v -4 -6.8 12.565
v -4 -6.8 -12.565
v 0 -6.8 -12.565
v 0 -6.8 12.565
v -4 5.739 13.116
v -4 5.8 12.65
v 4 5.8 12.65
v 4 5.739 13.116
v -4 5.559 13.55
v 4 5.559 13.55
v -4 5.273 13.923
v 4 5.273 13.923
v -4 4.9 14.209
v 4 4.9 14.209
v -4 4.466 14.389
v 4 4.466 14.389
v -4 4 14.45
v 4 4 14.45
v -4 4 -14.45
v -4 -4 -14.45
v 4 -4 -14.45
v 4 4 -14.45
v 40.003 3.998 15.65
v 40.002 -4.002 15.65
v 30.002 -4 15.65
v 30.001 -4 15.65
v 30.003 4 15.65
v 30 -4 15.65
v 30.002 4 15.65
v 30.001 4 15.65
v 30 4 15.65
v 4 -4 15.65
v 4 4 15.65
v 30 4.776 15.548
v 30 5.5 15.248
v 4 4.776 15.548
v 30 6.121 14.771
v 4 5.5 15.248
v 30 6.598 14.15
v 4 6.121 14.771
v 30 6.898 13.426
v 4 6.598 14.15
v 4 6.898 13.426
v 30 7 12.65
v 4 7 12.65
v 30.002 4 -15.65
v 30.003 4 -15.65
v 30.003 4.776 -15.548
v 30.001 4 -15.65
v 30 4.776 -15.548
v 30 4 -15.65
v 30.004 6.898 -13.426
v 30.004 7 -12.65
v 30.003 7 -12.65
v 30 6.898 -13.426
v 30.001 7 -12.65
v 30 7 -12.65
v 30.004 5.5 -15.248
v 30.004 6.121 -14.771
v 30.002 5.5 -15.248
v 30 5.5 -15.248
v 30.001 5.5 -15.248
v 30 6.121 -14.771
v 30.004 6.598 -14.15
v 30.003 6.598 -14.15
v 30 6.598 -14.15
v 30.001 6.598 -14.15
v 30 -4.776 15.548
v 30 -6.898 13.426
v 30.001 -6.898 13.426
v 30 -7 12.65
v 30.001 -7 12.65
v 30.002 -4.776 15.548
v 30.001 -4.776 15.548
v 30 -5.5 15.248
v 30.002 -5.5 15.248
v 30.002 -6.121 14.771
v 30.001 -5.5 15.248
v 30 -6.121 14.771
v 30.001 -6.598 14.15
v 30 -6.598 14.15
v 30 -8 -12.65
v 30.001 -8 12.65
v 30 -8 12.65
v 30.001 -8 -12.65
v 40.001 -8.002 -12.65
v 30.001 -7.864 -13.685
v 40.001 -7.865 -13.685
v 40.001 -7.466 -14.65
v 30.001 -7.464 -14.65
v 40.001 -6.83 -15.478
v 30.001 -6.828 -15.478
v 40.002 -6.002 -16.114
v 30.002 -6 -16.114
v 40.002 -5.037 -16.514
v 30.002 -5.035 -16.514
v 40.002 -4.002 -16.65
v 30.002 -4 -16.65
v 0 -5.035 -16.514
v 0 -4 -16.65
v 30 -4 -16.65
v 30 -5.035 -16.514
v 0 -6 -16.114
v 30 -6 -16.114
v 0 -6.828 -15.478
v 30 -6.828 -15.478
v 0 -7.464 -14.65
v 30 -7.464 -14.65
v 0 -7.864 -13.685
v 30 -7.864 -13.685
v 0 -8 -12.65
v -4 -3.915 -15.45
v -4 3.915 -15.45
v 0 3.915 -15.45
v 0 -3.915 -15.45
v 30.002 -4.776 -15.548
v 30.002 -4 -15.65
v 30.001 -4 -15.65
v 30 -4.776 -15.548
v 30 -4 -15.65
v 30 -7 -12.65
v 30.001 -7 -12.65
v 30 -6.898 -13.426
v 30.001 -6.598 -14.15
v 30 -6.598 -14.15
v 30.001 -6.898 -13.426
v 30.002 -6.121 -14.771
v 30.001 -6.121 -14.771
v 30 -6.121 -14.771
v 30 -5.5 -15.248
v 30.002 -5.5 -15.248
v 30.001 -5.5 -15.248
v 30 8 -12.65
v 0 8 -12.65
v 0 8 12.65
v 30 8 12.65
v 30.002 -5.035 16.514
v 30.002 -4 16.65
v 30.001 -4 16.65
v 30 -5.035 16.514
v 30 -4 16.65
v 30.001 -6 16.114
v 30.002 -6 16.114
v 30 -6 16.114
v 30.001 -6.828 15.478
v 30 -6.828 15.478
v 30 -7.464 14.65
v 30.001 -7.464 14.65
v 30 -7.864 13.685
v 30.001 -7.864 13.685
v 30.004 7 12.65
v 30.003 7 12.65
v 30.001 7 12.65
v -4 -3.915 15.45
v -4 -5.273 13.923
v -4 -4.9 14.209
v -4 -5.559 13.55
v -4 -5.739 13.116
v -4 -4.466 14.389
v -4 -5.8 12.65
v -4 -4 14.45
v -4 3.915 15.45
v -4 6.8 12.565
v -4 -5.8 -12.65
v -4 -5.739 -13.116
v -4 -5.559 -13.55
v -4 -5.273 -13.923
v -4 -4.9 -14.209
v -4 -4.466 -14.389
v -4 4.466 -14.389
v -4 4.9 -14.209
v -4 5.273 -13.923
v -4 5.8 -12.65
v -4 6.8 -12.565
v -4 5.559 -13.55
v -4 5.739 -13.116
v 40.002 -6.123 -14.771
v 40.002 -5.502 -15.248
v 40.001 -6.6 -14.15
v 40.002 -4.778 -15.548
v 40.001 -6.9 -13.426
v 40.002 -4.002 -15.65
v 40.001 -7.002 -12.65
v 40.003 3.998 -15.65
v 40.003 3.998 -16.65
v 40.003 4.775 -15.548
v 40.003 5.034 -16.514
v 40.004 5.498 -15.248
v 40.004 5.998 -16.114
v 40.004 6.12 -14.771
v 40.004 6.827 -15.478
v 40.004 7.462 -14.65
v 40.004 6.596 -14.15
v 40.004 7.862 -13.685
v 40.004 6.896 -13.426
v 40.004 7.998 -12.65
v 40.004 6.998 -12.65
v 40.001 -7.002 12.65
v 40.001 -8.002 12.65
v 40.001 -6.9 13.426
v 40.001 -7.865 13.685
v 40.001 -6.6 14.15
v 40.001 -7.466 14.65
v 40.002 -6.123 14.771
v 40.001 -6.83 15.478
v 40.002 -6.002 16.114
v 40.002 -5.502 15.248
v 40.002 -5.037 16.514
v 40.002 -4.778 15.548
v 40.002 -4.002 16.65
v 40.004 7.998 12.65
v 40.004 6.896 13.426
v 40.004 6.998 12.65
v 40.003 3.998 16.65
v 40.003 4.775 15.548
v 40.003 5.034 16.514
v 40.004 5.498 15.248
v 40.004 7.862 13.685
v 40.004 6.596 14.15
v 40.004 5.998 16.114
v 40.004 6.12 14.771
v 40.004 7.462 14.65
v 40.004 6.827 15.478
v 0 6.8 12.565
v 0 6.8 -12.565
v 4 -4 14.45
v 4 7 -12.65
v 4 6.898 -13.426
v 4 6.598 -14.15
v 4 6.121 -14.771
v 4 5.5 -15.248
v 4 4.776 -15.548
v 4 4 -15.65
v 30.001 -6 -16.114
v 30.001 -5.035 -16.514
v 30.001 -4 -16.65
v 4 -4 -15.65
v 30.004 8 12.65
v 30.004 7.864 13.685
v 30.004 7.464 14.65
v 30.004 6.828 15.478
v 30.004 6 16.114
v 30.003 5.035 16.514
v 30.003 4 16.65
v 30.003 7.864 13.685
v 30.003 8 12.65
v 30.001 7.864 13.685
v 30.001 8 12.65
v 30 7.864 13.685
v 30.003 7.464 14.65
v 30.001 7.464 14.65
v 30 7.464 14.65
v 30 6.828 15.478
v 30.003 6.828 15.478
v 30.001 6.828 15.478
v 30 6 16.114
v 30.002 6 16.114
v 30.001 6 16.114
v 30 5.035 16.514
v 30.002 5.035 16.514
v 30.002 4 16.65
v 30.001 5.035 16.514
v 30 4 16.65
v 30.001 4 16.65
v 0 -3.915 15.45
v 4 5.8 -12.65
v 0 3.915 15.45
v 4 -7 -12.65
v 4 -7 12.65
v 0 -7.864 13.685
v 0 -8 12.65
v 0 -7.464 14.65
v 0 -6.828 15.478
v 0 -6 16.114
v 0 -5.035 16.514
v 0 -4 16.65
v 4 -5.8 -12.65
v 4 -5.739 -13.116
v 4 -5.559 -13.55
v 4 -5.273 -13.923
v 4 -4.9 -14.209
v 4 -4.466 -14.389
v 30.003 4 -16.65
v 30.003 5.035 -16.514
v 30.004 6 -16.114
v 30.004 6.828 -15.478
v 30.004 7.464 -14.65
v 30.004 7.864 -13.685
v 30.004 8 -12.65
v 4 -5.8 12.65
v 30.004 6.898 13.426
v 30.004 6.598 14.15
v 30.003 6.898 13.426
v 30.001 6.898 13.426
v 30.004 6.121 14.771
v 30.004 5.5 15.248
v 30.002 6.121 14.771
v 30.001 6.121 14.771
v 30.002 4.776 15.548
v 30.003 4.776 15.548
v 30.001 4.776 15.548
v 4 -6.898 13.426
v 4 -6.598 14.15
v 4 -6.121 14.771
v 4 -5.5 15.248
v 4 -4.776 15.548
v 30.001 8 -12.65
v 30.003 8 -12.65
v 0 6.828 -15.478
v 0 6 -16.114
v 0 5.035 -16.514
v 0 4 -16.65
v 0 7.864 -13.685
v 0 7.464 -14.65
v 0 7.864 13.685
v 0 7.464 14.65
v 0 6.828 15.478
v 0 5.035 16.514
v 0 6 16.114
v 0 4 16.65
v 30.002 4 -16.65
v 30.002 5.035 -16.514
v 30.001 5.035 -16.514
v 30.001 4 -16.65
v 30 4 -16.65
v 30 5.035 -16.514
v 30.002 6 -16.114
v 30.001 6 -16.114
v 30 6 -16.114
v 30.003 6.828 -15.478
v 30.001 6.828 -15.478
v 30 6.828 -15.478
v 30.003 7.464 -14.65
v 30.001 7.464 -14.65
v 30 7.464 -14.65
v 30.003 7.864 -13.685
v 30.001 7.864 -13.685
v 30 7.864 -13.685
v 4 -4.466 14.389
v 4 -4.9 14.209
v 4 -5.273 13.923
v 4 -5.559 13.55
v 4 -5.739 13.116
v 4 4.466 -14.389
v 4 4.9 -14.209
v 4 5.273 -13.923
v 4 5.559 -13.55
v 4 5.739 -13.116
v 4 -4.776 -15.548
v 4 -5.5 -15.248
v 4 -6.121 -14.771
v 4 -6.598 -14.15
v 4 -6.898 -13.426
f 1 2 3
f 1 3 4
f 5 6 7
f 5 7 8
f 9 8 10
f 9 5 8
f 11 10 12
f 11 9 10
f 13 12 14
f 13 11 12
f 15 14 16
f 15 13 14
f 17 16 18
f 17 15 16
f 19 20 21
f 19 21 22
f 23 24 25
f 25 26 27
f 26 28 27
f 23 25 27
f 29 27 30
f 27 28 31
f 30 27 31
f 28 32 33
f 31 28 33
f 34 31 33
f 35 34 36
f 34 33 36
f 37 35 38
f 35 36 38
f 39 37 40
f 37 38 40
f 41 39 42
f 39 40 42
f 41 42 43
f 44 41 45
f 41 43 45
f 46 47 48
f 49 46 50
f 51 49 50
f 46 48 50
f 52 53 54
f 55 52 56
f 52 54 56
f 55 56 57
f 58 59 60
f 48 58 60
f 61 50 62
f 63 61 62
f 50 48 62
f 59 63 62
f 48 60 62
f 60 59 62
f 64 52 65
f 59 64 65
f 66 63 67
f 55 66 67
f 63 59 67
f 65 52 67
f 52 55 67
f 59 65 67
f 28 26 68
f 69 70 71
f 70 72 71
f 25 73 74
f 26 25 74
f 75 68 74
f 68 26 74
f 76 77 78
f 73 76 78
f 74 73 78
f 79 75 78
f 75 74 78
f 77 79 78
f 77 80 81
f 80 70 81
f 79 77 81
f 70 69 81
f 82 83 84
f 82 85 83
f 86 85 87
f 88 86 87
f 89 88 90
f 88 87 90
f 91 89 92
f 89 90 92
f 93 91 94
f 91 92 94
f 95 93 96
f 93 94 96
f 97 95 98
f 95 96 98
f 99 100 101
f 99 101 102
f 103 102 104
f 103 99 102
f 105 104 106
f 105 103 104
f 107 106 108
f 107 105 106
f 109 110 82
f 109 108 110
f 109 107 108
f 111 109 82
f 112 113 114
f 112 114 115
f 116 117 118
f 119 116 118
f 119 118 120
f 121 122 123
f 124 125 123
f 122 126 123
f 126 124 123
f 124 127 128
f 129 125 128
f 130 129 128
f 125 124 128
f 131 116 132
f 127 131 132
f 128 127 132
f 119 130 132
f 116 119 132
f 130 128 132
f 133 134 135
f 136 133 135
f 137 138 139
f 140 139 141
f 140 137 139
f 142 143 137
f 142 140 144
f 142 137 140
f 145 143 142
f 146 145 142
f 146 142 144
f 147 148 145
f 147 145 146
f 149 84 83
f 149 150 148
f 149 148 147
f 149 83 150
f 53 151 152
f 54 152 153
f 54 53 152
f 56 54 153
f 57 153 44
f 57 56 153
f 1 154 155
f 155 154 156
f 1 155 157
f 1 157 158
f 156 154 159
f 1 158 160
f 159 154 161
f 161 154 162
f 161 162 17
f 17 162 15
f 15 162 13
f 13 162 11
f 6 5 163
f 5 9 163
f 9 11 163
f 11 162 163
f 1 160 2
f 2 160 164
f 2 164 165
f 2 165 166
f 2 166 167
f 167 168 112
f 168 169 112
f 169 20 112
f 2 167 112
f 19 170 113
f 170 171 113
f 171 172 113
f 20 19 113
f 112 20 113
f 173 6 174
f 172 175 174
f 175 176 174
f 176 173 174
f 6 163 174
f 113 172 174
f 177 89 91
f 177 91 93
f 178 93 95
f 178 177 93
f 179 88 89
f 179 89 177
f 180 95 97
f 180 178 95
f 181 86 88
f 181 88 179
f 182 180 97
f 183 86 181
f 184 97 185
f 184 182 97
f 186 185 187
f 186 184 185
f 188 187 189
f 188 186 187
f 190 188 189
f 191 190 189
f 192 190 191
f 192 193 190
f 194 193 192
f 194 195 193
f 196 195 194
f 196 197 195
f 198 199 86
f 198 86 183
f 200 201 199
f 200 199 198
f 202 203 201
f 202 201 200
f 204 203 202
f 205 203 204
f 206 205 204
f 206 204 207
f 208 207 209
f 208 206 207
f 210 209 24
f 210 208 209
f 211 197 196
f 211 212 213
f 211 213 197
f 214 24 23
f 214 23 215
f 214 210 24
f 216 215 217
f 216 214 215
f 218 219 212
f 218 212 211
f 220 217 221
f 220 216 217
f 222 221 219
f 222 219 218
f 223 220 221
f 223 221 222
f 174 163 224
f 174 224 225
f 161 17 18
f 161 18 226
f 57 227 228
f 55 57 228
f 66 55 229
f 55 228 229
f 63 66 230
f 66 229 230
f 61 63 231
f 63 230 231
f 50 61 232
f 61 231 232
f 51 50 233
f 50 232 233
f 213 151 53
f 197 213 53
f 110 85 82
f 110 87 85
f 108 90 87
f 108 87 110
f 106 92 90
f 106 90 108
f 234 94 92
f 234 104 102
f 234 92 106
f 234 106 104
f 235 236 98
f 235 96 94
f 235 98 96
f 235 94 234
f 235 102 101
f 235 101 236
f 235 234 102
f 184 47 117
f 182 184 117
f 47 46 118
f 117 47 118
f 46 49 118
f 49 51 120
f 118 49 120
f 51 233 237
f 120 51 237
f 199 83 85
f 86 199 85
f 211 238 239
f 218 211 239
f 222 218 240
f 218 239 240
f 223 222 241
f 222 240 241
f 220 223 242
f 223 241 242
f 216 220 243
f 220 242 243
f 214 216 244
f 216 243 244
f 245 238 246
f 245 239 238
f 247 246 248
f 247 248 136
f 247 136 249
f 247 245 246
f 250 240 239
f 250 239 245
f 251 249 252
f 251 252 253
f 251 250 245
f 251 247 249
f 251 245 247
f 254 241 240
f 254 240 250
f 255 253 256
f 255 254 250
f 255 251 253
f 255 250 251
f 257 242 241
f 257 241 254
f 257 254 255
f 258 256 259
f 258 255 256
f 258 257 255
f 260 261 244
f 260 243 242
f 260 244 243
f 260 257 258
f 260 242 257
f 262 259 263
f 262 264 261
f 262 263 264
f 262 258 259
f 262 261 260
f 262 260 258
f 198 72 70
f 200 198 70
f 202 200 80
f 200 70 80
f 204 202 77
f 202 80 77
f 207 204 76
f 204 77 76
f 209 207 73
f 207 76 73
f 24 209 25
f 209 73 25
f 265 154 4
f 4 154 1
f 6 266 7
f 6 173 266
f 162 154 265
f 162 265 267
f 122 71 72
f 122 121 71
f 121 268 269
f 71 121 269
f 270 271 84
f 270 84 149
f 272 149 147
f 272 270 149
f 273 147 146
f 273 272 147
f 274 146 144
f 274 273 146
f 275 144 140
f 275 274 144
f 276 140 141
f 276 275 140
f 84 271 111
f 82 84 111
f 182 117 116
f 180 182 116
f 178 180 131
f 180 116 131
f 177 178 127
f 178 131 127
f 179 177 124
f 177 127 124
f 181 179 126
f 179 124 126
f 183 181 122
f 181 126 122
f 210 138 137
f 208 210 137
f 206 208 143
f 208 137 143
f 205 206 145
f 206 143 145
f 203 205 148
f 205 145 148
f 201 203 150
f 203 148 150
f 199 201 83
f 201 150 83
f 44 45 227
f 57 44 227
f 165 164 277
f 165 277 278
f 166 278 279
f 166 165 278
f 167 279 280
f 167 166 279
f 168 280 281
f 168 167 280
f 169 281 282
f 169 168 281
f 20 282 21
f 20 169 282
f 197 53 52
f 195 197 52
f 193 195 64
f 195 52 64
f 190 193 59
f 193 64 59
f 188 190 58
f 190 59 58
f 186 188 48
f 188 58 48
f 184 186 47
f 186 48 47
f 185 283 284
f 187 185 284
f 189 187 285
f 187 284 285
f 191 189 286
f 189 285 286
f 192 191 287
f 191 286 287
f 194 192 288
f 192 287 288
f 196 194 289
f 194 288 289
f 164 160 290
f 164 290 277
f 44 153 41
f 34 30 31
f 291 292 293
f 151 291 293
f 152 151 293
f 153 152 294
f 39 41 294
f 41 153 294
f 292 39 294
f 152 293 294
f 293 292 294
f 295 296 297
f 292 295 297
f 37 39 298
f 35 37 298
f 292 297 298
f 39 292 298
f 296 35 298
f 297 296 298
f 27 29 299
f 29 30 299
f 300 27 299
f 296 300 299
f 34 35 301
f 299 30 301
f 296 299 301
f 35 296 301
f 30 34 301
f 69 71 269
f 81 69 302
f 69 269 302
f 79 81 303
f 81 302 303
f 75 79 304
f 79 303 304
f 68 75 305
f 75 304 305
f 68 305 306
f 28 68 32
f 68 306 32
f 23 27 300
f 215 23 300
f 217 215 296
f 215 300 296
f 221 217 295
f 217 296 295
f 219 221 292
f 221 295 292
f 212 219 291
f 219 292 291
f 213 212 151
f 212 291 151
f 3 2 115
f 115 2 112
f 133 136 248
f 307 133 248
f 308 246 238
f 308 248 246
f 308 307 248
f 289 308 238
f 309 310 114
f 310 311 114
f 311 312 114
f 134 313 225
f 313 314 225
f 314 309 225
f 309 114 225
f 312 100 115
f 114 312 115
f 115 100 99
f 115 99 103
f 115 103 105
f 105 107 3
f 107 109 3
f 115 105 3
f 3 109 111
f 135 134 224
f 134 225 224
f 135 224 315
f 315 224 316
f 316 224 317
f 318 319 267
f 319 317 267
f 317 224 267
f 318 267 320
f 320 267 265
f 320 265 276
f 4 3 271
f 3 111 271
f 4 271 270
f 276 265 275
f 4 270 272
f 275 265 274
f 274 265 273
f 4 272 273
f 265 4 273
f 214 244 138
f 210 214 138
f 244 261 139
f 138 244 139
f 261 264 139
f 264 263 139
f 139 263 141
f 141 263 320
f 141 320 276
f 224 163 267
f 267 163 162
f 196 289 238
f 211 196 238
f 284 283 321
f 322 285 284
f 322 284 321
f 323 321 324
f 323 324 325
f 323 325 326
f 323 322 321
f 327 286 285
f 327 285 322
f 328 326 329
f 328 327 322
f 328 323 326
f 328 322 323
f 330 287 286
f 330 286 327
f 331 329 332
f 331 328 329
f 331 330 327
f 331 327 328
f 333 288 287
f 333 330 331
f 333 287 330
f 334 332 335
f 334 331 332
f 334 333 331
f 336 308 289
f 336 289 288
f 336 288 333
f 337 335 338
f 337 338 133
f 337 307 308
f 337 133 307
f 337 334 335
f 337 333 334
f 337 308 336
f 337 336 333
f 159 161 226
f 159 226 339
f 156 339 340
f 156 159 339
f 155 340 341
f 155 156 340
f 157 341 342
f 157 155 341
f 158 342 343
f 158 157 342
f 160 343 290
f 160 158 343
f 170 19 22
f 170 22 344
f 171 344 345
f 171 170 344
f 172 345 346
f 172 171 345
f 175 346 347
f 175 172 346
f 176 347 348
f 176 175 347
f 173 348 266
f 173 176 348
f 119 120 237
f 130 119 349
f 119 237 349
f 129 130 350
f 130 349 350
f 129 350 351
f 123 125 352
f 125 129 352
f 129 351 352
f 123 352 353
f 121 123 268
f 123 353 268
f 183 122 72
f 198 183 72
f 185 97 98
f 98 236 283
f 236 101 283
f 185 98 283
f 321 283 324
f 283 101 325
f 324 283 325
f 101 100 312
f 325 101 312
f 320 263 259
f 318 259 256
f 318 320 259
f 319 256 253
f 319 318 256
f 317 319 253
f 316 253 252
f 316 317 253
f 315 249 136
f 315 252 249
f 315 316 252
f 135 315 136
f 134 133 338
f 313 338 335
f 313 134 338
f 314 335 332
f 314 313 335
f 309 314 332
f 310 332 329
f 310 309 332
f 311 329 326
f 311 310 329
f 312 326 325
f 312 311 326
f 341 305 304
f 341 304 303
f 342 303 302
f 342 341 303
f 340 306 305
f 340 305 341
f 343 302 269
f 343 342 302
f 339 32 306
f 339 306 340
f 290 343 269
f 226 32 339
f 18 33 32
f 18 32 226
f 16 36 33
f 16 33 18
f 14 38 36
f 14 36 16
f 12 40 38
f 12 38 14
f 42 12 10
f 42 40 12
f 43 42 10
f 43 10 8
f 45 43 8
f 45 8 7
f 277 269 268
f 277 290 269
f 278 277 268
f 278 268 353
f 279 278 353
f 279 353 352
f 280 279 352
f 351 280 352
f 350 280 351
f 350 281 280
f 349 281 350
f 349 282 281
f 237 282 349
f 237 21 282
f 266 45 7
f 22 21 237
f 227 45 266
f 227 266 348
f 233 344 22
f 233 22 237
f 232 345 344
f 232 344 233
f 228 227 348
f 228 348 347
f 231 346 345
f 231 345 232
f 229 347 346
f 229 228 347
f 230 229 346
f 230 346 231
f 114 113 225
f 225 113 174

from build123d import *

# Parameters (mm, degrees)
BOSS_EXTRUDE7_DEPTH        = 4
CUT_EXTRUDE1_DEPTH         = 4
CUT_EXTRUDE5_SCIECIA_DEPTH = 4


with BuildPart() as part:
    # Sweep1: sweep along a path in Sketch2path
    with BuildLine(Plane.XY) as sweep1_path:
        Line((40.002617842, -0.001745558), (30.002617994, -2.28e-07))
        ThreePointArc((30.002617994, -2.28e-07), (30.001308997, -5.7e-08), (30, 0))
        Line((30, 0), (0, 0))
    # Sketch3 → Sweep1 (sweep)
    with BuildSketch(Plane(origin=(0, 0, 0), x_dir=(0, 0, -1), z_dir=(1, 0, 0))):
        with BuildLine():
            Line((-16.65, -4), (-16.65, 4))
            ThreePointArc((-16.65, 4), (-15.478427125, 6.828427125), (-12.65, 8))
            Line((-12.65, 8), (12.65, 8))
            ThreePointArc((12.65, 8), (15.478427125, 6.828427125), (16.65, 4))
            Line((16.65, 4), (16.65, -4))
            ThreePointArc((16.65, -4), (15.478427125, -6.828427125), (12.65, -8))
            Line((12.65, -8), (-12.65, -8))
            ThreePointArc((-12.65, -8), (-15.478427125, -6.828427125), (-16.65, -4))
        make_face()
        with BuildLine():
            Line((-15.65, -4), (-15.65, 4))
            ThreePointArc((-15.65, 4), (-14.771320344, 6.121320344), (-12.65, 7))
            Line((-12.65, 7), (12.65, 7))
            ThreePointArc((12.65, 7), (14.771320344, 6.121320344), (15.65, 4))
            Line((15.65, 4), (15.65, -4))
            ThreePointArc((15.65, -4), (14.771320344, -6.121320344), (12.65, -7))
            Line((12.65, -7), (-12.65, -7))
            ThreePointArc((-12.65, -7), (-14.771320344, -6.121320344), (-15.65, -4))
        make_face(mode=Mode.SUBTRACT)
    sweep(path=sweep1_path.line)

    # Sketch14 → Boss-Extrude7 (add, symmetric)
    with BuildSketch(Plane.ZY):
        with BuildLine():
            Line((-15.65, -4), (-15.65, 4))
            ThreePointArc((-15.65, 4), (-14.771320344, 6.121320344), (-12.65, 7))
            Line((-12.65, 7), (12.65, 7))
            ThreePointArc((12.65, 7), (14.771320344, 6.121320344), (15.65, 4))
            Line((15.65, 4), (15.65, -4))
            ThreePointArc((15.65, -4), (14.771320344, -6.121320344), (12.65, -7))
            Line((12.65, -7), (-12.65, -7))
            ThreePointArc((-12.65, -7), (-14.771320344, -6.121320344), (-15.65, -4))
        make_face()
        with BuildLine():
            Line((-12.65, 5.8), (12.65, 5.8))
            ThreePointArc((12.65, 5.8), (13.922792206, 5.272792206), (14.45, 4))
            Line((14.45, 4), (14.45, -4))
            ThreePointArc((14.45, -4), (13.922792206, -5.272792206), (12.65, -5.8))
            Line((12.65, -5.8), (-12.65, -5.8))
            ThreePointArc((-12.65, -5.8), (-13.922792206, -5.272792206), (-14.45, -4))
            Line((-14.45, -4), (-14.45, 4))
            ThreePointArc((-14.45, 4), (-13.922792206, 5.272792206), (-12.65, 5.8))
        make_face(mode=Mode.SUBTRACT)
    extrude(amount=BOSS_EXTRUDE7_DEPTH, both=True)

    # Sketch15 → Cut-Extrude1 (cut)
    with BuildSketch(Plane.ZY.offset(4)):
        with BuildLine():
            Line((-12.65, -7), (12.65, -7))
            ThreePointArc((12.65, -7), (14.771320344, -6.121320344), (15.65, -4))
            Line((15.65, -4), (15.65, 4))
            ThreePointArc((15.65, 4), (14.771320344, 6.121320344), (12.65, 7))
            Line((12.65, 7), (-12.65, 7))
            ThreePointArc((-12.65, 7), (-14.771320344, 6.121320344), (-15.65, 4))
            Line((-15.65, 4), (-15.65, -4))
            ThreePointArc((-15.65, -4), (-14.771320344, -6.121320344), (-12.65, -7))
        make_face()
        with BuildLine():
            Line((-15.45, 4), (-15.45, -4))
            ThreePointArc((-15.45, -4), (-14.629898987, -5.979898987), (-12.65, -6.8))
            Line((-12.65, -6.8), (12.65, -6.8))
            ThreePointArc((12.65, -6.8), (14.629898987, -5.979898987), (15.45, -4))
            Line((15.45, -4), (15.45, 4))
            ThreePointArc((15.45, 4), (14.629898987, 5.979898987), (12.65, 6.8))
            Line((12.65, 6.8), (-12.65, 6.8))
            ThreePointArc((-12.65, 6.8), (-14.629898987, 5.979898987), (-15.45, 4))
        make_face(mode=Mode.SUBTRACT)
    extrude(amount=-CUT_EXTRUDE1_DEPTH, mode=Mode.SUBTRACT)

    # Sketch20 → Cut-Extrude5 sciecia (cut)
    with BuildSketch(Plane.ZY.offset(4)):
        with BuildLine():
            Line((16.65, 2.715147186), (16.65, 4))
            ThreePointArc((16.65, 4), (15.478427125, 6.828427125), (12.65, 8))
            Line((12.65, 8), (11.365147186, 8))
            Line((11.365147186, 8), (16.65, 2.715147186))
        make_face()
        with BuildLine():
            Line((-11.365147186, 8), (-12.65, 8))
            ThreePointArc((-12.65, 8), (-15.478427125, 6.828427125), (-16.65, 4))
            Line((-16.65, 4), (-16.65, 2.715147186))
            Line((-16.65, 2.715147186), (-11.365147186, 8))
        make_face()
        with BuildLine():
            Line((11.365147186, -8), (12.65, -8))
            ThreePointArc((12.65, -8), (15.478427125, -6.828427125), (16.65, -4))
            Line((16.65, -4), (16.65, -2.715147186))
            Line((16.65, -2.715147186), (11.365147186, -8))
        make_face()
        with BuildLine():
            Line((-16.65, -2.715147186), (-16.65, -4))
            ThreePointArc((-16.65, -4), (-15.478427125, -6.828427125), (-12.65, -8))
            Line((-12.65, -8), (-11.365147186, -8))
            Line((-11.365147186, -8), (-16.65, -2.715147186))
        make_face()
    extrude(amount=-CUT_EXTRUDE5_SCIECIA_DEPTH, mode=Mode.SUBTRACT)


solid = part.part
